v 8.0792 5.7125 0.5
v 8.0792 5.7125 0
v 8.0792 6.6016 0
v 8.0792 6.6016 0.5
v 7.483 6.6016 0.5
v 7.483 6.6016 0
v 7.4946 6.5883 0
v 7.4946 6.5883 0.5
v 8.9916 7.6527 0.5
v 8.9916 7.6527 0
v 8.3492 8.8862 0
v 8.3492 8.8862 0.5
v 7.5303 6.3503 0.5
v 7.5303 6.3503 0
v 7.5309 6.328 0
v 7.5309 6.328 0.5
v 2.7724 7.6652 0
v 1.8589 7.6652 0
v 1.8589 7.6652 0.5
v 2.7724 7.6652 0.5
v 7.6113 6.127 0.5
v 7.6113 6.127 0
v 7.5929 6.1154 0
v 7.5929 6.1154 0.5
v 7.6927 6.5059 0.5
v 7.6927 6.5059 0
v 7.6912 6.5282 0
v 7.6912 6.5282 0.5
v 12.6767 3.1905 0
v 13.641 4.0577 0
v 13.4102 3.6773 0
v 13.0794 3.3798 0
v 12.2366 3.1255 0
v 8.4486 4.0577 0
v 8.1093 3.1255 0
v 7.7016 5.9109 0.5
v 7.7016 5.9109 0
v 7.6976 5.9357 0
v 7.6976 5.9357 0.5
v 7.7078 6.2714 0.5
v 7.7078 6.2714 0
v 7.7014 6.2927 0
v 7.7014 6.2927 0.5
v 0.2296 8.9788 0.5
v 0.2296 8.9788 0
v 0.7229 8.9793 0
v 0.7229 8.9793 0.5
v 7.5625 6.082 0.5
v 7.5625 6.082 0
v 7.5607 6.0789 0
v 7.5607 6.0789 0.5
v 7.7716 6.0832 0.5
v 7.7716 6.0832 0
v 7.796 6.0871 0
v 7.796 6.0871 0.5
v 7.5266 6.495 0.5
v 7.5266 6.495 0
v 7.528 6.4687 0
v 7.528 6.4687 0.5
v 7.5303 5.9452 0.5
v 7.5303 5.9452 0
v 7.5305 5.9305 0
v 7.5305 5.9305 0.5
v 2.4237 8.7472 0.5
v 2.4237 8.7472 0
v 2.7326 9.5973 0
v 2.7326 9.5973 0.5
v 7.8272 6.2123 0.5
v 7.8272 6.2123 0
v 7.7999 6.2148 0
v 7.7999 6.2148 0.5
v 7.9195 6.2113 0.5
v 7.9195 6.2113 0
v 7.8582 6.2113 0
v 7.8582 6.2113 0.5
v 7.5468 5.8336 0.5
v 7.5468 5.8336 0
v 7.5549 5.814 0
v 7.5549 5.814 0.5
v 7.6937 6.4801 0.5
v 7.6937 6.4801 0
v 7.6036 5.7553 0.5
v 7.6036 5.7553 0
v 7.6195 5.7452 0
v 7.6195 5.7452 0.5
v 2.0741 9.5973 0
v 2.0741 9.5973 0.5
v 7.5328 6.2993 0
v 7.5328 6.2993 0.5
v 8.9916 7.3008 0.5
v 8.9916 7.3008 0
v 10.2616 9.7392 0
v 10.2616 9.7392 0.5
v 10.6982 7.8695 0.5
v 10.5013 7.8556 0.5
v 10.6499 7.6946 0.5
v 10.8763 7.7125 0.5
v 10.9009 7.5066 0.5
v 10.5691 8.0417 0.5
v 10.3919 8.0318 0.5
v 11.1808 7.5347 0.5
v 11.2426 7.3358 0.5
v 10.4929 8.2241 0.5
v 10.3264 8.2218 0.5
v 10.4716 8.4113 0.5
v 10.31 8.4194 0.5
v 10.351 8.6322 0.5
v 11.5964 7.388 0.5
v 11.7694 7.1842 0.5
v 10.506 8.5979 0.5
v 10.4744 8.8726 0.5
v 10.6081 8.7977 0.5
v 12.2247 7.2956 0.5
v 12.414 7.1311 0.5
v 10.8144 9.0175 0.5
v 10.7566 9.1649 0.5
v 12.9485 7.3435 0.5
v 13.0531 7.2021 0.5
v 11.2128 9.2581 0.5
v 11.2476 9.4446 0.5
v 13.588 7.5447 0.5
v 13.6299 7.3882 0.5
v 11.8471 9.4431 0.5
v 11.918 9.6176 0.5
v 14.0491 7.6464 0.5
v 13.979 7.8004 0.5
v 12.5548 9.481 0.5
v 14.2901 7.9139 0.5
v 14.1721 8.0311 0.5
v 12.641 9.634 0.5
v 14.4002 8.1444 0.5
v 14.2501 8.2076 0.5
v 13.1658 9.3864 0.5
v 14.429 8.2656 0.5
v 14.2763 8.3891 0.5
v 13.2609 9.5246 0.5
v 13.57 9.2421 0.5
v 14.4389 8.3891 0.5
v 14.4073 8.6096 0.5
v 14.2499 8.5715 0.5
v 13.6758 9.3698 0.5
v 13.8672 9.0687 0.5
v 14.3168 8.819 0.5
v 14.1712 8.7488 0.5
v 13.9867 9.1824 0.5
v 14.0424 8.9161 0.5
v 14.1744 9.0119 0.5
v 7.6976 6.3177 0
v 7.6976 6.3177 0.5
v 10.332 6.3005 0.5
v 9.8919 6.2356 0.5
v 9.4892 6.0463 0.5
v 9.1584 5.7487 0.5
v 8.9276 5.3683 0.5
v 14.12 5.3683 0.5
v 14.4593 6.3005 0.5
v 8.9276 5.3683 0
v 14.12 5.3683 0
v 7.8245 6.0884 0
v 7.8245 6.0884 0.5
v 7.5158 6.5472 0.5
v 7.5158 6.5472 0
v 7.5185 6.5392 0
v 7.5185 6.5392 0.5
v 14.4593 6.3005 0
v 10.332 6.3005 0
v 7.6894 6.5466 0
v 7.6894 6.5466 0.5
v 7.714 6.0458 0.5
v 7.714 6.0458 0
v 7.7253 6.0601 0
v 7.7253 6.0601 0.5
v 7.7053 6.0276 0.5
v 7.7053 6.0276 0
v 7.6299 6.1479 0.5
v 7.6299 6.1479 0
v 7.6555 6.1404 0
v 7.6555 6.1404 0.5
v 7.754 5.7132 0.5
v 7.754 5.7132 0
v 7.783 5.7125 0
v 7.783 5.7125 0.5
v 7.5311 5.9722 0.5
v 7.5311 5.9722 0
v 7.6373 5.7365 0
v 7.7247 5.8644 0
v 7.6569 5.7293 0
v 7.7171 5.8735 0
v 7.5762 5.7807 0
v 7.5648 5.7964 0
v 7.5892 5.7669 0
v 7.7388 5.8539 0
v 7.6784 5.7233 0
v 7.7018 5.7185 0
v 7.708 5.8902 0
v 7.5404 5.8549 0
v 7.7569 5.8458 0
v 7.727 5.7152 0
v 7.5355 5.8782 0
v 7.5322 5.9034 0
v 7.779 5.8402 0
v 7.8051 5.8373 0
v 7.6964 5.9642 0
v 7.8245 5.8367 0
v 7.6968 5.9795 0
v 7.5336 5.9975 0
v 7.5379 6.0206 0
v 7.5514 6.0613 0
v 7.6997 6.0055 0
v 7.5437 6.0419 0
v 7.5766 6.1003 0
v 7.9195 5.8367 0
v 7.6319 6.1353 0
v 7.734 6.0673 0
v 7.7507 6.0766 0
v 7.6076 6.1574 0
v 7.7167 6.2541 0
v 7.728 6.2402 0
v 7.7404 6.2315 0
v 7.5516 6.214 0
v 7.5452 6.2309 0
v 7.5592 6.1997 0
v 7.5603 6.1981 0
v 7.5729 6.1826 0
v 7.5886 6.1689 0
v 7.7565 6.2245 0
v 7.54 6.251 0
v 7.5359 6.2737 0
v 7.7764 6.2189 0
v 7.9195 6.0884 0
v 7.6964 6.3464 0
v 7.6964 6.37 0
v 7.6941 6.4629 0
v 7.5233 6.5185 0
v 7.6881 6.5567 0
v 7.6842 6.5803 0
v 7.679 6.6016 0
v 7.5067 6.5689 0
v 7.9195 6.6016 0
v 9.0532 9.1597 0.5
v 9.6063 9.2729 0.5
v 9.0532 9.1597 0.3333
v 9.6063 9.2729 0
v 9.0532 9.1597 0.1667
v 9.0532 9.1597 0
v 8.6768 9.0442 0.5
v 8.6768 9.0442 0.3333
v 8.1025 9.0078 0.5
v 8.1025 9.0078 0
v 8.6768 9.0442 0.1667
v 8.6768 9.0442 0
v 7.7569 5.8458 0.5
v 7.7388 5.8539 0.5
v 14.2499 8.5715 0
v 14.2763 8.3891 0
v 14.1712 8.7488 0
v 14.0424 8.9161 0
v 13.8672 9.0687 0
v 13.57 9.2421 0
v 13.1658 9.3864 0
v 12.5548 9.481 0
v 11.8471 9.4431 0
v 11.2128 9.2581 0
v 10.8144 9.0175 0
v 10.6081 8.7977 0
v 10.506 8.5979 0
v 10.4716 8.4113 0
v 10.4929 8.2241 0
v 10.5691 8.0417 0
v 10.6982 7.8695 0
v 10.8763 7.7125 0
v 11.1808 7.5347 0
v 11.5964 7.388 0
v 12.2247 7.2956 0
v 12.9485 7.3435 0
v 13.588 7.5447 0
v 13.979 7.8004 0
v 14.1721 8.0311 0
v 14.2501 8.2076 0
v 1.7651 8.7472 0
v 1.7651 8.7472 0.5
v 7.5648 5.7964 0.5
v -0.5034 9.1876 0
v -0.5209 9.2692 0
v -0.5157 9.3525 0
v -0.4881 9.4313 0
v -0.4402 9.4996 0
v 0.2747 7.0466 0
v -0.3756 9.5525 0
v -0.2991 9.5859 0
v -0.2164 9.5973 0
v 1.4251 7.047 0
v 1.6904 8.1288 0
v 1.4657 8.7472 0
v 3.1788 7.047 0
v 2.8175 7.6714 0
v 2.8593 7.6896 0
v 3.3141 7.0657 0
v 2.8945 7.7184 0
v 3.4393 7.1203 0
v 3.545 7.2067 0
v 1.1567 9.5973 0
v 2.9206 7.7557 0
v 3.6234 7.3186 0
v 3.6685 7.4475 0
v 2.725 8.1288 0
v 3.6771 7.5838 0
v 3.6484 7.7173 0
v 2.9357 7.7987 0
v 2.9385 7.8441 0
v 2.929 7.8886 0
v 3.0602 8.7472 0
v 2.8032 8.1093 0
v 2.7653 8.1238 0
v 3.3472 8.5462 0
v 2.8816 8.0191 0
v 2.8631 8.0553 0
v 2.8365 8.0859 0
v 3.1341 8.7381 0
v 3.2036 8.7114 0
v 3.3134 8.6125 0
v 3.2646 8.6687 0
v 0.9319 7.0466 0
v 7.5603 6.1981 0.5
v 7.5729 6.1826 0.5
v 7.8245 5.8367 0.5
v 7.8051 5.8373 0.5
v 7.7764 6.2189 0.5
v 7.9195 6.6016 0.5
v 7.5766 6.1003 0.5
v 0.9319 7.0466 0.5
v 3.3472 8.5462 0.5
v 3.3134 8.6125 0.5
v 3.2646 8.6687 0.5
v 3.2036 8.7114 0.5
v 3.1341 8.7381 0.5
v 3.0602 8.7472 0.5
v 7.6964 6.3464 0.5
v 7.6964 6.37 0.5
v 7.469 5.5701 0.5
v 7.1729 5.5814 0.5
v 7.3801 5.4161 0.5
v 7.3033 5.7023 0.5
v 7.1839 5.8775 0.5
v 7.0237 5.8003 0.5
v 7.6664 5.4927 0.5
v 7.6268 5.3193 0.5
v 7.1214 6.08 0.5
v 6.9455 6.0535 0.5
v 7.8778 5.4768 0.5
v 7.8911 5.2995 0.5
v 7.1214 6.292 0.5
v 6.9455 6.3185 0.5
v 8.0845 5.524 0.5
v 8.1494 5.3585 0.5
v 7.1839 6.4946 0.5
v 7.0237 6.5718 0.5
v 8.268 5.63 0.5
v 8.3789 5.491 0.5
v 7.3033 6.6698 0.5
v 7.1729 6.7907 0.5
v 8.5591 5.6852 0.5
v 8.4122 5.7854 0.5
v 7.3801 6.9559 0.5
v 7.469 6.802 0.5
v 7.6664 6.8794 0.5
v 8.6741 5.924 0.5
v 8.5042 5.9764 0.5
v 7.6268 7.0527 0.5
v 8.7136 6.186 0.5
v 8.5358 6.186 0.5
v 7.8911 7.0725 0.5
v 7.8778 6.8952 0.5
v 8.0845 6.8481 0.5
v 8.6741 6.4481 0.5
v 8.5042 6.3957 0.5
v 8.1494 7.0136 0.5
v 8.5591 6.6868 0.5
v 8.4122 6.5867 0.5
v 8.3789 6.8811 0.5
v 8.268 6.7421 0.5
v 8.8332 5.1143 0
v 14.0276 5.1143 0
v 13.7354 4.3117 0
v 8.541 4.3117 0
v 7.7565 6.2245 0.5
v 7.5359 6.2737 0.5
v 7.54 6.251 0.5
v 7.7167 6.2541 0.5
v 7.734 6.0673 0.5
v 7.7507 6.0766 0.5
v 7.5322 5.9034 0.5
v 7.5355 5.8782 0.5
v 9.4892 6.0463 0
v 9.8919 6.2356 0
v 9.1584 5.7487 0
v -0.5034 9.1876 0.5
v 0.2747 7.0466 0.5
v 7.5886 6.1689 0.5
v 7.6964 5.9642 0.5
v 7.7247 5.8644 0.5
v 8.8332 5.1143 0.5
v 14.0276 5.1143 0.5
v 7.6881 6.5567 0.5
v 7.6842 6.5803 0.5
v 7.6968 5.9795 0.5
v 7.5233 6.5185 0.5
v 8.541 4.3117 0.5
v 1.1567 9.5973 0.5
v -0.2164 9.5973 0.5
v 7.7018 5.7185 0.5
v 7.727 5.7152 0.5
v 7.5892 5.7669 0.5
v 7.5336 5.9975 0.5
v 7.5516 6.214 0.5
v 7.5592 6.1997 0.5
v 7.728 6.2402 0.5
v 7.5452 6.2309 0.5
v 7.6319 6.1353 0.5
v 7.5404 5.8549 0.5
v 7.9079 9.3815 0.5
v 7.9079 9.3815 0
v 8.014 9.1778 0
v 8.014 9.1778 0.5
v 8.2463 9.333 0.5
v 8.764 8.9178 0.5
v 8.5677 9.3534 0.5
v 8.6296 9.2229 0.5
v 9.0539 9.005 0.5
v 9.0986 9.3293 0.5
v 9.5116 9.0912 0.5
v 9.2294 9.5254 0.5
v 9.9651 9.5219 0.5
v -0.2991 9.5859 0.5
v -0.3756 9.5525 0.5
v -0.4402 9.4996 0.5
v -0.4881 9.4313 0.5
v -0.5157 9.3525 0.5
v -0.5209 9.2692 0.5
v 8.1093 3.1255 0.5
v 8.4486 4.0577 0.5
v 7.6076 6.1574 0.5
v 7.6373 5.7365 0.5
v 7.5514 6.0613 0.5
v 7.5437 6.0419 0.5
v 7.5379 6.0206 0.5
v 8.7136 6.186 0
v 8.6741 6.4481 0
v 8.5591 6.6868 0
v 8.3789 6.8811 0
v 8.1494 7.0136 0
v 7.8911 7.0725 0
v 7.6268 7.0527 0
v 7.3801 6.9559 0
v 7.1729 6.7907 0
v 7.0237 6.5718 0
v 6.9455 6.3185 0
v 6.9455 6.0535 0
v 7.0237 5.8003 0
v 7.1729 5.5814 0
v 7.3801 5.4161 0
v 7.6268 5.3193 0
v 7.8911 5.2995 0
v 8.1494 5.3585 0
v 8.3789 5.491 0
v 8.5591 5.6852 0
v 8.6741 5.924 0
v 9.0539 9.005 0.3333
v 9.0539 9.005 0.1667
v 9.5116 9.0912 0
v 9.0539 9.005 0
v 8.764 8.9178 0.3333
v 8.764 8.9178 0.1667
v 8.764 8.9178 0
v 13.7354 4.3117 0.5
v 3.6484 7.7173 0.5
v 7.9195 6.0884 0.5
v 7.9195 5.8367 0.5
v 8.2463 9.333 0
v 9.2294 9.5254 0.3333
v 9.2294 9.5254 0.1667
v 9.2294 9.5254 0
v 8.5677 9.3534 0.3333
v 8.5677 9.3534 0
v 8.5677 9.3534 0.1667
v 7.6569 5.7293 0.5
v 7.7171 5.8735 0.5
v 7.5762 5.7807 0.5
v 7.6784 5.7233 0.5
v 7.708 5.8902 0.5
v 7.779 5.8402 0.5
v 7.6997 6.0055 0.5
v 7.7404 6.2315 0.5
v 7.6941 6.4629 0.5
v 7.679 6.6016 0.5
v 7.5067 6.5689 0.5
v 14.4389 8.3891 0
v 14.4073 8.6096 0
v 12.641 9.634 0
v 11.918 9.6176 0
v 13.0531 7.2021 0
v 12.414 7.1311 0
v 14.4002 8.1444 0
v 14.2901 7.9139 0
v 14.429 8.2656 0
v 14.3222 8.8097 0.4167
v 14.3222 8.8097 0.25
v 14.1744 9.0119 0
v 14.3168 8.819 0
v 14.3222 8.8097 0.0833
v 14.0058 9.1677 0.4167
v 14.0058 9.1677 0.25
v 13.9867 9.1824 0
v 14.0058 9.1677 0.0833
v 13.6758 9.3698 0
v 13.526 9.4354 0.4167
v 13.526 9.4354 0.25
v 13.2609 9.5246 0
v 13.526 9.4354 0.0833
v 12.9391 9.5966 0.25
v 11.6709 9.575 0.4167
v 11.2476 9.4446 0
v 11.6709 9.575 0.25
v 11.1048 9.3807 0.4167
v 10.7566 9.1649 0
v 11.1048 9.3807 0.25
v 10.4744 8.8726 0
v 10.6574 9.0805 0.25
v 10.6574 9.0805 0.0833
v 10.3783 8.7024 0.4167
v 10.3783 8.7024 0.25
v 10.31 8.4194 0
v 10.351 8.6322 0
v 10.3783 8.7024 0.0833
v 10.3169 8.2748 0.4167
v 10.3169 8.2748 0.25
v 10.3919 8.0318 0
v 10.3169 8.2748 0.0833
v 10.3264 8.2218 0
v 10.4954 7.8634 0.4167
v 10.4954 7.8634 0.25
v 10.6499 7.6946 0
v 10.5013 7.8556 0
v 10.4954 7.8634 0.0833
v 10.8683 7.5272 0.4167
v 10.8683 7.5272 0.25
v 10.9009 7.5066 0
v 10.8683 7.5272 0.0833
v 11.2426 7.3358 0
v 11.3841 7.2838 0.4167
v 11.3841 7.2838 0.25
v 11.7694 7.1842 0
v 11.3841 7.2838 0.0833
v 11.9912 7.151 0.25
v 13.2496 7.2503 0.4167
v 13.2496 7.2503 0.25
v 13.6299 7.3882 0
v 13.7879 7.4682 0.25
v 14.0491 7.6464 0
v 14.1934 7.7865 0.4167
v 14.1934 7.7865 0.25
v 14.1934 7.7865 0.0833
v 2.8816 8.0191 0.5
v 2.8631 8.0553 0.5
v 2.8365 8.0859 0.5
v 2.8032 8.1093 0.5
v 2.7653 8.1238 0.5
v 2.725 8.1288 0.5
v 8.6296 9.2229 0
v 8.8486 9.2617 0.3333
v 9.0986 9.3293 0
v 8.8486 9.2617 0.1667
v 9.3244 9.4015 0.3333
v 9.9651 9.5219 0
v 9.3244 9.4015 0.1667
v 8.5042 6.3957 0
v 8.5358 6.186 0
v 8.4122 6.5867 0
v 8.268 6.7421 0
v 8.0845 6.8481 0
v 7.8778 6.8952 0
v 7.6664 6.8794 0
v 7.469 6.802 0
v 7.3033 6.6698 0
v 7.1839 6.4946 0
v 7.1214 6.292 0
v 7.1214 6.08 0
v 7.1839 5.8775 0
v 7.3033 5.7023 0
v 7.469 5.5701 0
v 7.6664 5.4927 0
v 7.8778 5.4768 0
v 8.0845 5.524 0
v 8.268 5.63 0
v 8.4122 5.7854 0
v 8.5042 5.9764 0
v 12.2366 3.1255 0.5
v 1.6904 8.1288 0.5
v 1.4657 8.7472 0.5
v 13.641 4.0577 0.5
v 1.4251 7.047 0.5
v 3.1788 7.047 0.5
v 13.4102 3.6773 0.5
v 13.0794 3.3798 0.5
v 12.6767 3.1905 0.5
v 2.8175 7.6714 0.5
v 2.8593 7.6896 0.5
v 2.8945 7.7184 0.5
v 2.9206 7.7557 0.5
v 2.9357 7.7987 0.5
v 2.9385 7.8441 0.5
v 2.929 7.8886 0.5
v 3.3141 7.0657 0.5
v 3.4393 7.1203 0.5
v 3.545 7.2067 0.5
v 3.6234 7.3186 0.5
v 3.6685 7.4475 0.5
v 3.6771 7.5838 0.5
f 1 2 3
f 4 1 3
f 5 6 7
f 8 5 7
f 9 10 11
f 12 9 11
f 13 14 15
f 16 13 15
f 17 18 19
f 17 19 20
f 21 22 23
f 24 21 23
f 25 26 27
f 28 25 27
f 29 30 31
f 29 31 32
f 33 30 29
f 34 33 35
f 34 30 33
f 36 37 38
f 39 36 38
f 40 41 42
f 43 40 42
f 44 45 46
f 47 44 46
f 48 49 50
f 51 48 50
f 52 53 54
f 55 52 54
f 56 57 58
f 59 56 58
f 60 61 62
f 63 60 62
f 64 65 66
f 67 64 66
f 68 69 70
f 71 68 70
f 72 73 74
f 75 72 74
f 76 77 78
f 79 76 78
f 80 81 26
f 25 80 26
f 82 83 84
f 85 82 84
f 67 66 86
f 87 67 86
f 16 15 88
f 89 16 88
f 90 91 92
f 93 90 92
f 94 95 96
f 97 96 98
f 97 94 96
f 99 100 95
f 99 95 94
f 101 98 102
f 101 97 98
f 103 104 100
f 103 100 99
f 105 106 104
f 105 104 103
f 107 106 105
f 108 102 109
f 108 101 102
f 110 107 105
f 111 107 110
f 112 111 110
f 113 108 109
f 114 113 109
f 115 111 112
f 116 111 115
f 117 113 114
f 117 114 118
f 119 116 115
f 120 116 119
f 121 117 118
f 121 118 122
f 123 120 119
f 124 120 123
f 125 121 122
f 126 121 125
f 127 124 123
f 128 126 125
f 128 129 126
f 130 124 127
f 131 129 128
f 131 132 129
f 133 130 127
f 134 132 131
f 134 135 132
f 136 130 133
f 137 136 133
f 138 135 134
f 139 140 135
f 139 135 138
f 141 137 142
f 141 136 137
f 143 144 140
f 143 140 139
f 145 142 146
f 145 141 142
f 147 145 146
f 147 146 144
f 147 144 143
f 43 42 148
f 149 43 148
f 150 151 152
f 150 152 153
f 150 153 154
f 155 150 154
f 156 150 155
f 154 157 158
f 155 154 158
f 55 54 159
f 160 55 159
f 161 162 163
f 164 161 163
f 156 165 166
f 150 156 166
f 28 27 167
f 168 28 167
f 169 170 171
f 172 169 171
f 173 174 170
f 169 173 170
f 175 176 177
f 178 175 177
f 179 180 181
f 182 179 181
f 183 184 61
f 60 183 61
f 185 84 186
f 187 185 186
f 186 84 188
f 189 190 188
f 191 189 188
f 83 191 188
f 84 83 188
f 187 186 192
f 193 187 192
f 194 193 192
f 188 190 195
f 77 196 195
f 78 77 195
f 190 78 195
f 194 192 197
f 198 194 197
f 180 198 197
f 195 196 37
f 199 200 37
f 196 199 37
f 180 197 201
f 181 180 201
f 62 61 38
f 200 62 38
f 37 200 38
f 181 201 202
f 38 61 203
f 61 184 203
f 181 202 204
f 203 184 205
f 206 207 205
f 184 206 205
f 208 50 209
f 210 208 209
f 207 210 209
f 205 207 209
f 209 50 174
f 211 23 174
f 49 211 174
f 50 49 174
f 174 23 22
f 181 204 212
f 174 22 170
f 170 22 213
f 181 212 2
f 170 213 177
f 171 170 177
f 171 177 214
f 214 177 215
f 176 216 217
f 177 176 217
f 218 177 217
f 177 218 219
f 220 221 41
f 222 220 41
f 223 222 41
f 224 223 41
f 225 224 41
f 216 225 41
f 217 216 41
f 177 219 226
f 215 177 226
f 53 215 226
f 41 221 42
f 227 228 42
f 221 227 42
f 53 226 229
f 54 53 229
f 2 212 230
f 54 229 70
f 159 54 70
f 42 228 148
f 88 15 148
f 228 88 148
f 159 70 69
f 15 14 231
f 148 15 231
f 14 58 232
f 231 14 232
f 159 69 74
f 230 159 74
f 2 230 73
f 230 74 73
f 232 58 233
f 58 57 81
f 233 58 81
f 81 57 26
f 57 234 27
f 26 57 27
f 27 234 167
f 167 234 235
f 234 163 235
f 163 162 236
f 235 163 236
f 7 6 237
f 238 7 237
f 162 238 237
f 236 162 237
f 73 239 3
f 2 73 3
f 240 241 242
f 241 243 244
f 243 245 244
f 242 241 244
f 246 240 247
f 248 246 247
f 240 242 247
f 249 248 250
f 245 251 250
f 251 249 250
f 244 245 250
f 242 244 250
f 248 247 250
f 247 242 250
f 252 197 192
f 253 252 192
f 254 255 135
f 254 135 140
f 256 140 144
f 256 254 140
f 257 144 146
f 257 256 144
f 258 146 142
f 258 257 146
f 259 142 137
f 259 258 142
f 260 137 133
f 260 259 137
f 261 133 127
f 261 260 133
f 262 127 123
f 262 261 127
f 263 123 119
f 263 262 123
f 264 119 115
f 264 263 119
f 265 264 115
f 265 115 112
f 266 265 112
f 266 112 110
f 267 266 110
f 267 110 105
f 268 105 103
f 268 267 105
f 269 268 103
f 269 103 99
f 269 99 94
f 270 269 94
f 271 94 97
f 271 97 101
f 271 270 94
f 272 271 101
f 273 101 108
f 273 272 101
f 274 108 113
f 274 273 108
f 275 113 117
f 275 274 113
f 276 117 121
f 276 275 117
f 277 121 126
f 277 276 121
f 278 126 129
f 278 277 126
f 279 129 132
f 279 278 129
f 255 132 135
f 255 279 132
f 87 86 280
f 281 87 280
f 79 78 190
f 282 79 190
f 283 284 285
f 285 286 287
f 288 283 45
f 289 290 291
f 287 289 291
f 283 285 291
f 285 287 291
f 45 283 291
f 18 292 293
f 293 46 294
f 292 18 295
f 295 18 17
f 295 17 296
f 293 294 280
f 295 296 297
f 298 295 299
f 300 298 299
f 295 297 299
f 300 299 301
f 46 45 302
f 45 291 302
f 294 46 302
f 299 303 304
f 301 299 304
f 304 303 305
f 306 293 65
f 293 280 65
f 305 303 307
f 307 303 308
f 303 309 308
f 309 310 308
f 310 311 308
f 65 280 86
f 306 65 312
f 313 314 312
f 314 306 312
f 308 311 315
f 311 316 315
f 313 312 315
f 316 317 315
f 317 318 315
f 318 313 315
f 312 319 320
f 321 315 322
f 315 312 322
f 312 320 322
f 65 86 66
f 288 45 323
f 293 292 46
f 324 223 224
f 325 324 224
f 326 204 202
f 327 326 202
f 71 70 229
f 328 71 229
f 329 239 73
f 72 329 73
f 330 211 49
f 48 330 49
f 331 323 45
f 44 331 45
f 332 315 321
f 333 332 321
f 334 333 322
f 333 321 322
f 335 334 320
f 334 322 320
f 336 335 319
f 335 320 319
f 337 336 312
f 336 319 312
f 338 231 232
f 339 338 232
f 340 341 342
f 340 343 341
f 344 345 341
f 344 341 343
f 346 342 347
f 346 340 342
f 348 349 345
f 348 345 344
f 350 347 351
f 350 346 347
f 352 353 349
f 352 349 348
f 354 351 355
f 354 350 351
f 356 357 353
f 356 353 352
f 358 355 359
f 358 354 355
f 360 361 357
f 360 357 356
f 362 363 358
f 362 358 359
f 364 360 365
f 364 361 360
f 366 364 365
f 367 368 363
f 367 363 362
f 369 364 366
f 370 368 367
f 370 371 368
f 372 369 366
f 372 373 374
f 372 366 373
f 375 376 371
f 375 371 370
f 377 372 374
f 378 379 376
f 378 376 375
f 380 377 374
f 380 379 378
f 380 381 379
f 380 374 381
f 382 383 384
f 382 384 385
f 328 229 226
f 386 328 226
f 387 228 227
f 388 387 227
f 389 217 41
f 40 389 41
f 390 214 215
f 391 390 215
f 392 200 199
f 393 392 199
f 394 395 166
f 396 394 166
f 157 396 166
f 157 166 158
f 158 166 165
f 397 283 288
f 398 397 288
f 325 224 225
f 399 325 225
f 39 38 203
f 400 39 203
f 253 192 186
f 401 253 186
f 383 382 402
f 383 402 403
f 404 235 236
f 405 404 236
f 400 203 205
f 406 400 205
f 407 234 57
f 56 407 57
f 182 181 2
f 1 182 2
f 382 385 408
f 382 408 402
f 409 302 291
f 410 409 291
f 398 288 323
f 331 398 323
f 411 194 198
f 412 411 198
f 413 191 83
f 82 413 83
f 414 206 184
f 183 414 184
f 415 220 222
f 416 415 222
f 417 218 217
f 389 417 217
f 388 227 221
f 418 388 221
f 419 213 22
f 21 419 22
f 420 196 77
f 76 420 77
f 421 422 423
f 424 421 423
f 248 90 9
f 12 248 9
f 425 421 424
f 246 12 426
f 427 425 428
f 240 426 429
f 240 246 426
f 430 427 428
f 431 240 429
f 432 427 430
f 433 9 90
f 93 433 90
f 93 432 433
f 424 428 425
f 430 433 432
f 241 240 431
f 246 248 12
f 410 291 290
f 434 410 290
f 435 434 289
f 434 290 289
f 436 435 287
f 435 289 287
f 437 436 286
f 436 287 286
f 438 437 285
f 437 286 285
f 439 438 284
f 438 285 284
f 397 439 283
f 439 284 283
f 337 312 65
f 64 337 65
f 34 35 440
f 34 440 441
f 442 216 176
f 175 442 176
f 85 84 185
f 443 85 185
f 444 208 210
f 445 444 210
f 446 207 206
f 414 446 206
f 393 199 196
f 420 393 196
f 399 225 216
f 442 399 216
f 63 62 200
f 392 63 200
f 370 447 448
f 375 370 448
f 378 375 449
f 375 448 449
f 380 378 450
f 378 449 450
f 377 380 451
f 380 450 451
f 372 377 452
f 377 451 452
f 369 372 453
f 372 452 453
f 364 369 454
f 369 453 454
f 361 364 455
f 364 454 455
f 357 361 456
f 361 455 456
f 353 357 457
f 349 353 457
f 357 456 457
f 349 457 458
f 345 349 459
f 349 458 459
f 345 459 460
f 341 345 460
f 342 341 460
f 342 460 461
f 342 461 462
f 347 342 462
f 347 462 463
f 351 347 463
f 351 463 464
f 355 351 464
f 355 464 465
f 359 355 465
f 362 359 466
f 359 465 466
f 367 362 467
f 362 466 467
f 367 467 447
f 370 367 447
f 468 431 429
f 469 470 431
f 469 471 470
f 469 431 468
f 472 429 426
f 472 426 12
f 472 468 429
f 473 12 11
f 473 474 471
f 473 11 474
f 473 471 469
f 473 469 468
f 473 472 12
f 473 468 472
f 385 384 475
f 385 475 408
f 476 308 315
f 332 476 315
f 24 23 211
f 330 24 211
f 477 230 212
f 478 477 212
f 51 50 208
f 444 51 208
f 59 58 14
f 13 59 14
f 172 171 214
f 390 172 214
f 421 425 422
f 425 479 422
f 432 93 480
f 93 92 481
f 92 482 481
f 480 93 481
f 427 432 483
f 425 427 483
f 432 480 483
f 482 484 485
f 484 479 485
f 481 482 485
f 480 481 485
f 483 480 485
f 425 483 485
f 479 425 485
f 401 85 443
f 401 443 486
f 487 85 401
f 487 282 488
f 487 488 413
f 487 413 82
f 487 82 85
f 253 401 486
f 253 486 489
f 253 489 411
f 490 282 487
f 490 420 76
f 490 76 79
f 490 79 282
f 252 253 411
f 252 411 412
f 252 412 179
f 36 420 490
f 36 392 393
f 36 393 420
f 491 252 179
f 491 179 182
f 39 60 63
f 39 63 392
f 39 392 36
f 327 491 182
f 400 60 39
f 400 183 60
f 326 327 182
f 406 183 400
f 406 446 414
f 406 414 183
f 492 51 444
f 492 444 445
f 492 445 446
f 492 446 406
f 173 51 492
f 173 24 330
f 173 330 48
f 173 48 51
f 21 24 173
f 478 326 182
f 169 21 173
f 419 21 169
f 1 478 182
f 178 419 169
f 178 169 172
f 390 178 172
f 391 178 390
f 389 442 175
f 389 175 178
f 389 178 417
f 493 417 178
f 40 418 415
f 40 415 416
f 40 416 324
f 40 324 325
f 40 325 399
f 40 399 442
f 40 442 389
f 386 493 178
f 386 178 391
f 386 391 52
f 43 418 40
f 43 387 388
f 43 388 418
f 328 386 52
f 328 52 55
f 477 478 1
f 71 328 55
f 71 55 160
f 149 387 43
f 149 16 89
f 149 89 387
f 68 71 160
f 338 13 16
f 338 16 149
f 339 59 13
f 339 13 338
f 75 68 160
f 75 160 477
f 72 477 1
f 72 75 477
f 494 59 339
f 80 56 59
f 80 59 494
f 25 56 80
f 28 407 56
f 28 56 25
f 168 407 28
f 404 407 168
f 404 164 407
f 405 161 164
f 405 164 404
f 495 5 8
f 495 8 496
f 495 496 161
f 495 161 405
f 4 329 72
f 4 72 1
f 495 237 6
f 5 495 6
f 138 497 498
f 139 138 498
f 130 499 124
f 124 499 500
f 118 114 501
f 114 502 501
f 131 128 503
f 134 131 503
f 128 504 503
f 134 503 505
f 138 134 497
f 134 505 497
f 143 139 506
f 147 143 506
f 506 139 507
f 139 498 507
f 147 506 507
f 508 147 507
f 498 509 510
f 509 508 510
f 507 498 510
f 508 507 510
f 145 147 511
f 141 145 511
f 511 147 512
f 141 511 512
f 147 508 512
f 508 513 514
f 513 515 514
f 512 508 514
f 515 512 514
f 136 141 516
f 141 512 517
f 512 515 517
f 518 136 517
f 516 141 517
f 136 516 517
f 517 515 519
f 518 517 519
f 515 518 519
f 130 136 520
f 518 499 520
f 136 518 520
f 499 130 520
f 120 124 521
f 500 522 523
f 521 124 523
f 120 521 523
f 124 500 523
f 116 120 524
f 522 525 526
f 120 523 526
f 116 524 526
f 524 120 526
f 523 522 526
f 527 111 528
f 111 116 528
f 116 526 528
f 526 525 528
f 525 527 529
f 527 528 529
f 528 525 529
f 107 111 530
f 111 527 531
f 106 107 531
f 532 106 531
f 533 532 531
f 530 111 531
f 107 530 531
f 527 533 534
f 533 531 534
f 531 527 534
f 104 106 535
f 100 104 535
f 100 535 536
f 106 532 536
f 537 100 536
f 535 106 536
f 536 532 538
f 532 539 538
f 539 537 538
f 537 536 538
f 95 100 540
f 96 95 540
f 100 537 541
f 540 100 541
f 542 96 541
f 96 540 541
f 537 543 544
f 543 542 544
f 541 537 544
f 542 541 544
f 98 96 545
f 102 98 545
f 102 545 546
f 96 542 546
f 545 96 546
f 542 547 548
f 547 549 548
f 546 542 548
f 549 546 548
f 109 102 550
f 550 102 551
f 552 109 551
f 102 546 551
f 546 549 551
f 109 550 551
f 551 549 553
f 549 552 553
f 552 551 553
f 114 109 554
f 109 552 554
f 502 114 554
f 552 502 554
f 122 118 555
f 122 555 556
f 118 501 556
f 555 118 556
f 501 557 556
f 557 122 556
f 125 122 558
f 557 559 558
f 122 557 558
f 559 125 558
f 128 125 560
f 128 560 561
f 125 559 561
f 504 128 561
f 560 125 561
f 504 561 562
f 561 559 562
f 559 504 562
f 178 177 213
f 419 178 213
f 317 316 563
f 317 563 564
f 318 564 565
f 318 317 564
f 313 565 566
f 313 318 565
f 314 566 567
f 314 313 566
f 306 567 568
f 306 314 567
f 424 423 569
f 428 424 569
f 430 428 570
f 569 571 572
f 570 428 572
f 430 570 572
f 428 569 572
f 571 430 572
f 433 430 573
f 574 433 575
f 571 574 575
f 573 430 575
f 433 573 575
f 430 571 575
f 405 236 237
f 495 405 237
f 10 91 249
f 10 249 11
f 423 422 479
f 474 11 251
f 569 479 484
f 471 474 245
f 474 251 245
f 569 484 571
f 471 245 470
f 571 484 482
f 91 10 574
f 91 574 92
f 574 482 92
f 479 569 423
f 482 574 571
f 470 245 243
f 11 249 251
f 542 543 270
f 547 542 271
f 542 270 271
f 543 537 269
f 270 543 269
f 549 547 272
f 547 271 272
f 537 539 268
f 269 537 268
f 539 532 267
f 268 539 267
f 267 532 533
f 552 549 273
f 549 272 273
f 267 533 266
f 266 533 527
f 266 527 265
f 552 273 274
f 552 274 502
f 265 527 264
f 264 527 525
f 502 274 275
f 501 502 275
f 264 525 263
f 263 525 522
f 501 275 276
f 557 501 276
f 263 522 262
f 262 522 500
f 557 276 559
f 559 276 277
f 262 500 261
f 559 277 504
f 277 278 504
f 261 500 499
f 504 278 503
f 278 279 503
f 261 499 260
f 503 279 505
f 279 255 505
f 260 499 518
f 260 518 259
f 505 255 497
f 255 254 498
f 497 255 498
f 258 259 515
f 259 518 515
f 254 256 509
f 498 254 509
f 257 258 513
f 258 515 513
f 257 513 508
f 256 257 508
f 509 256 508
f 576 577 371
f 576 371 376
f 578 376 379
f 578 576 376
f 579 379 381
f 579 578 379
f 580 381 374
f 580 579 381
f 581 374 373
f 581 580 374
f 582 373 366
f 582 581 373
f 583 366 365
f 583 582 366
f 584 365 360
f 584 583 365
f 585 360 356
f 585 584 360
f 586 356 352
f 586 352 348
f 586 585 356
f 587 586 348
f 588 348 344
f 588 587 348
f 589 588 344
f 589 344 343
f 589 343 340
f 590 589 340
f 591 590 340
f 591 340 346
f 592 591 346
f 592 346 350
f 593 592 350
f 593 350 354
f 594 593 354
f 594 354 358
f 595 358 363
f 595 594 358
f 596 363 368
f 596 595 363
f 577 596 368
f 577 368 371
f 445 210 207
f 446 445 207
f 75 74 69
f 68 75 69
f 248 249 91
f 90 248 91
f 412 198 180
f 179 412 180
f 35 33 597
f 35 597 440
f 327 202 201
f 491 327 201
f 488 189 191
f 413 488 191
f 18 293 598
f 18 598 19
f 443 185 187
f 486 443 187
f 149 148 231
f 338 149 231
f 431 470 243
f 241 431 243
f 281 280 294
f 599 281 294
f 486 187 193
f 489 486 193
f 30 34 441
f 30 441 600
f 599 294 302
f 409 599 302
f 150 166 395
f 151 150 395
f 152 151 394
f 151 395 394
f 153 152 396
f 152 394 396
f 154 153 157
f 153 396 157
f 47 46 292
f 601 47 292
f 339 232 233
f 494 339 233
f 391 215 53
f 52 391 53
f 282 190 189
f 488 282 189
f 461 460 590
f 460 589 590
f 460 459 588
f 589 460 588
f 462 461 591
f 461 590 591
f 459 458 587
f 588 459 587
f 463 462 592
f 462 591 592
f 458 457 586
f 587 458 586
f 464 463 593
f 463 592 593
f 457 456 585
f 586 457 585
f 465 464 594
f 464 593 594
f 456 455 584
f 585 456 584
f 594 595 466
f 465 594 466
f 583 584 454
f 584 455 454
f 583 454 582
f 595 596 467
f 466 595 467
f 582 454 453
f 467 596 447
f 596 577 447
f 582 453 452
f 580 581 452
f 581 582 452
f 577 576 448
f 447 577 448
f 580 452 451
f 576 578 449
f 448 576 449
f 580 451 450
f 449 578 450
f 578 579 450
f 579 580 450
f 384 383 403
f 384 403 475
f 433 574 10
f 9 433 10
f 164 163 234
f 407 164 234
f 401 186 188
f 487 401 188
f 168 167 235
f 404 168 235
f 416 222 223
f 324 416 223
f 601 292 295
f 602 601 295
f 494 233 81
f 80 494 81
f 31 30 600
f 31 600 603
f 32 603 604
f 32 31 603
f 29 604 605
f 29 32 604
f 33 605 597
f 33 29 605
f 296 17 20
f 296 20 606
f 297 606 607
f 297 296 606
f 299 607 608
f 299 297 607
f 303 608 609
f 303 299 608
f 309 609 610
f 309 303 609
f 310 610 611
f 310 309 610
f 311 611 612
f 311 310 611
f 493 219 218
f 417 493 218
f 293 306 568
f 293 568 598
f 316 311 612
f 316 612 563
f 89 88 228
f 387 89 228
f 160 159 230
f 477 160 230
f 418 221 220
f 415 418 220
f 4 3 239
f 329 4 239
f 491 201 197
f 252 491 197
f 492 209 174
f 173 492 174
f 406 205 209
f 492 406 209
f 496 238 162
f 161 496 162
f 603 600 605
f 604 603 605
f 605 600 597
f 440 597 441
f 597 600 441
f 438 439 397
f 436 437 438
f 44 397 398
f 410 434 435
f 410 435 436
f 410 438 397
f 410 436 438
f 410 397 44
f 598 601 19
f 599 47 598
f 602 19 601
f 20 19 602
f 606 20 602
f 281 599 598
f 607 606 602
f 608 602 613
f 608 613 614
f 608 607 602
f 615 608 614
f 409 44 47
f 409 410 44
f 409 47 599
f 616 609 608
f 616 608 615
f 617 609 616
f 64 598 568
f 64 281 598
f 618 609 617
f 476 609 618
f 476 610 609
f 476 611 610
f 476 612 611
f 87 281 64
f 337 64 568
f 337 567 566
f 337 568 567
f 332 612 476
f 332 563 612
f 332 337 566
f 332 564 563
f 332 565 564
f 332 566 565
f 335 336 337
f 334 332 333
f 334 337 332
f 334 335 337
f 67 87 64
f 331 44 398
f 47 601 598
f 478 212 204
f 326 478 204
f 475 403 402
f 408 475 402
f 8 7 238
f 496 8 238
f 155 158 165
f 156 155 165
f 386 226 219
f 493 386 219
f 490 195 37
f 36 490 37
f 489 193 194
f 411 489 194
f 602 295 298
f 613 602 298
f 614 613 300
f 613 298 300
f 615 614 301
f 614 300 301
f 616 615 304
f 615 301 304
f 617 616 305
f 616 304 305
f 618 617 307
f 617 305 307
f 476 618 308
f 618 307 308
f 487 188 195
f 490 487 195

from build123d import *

# Parameters (mm, degrees)
SKETCH_1_R        = 0.889
SKETCH_1_R_2      = 0.7112
EXTRUDE_1_DEPTH   = 0.5
EXTRUDE_1_2_DEPTH = 0.5
EXTRUDE_1_3_DEPTH = 0.5
EXTRUDE_1_4_DEPTH = 0.5
EXTRUDE_1_5_DEPTH = 0.5
EXTRUDE_1_6_DEPTH = 0.5
EXTRUDE_1_7_DEPTH = 0.5
SKETCH_1_RX       = 1.902570153
SKETCH_1_RY       = 1.096871421
EXTRUDE_1_8_DEPTH = 0.5


with BuildPart() as part:
    # 草圖1 → 填料-伸長1 (new body)
    with BuildSketch(Plane.XY):
        with Locations((7.824620046, 6.186033695)):
            Circle(SKETCH_1_R)
        with Locations((7.824620046, 6.186033695)):
            Circle(SKETCH_1_R_2, mode=Mode.SUBTRACT)
    extrude(amount=EXTRUDE_1_DEPTH)


with BuildPart() as body_2:
    # 草圖1 → Extrude 1 2 (new body)
    with BuildSketch(Plane.XY):
        with BuildLine():
            Line((8.448576012, 4.057698906), (13.640963376, 4.057698906))
            ThreePointArc((13.640963376, 4.057698906), (13.079373986, 3.379772931), (12.236568457, 3.125518906))
            Line((12.236568457, 3.125518906), (8.109290239, 3.125518906))
            Line((8.109290239, 3.125518906), (8.448576012, 4.057698906))
        make_face()
    extrude(amount=EXTRUDE_1_2_DEPTH)


with BuildPart() as body_3:
    # 草圖1 → Extrude 1 3 (new body)
    with BuildSketch(Plane.XY):
        with BuildLine():
            Line((8.927617103, 5.368338906), (14.120004466, 5.368338906))
            Line((14.120004466, 5.368338906), (14.459290239, 6.300518906))
            Line((14.459290239, 6.300518906), (10.332012021, 6.300518906))
            ThreePointArc((10.332012021, 6.300518906), (9.489206492, 6.04626488), (8.927617103, 5.368338906))
        make_face()
    extrude(amount=EXTRUDE_1_3_DEPTH)


with BuildPart() as body_4:
    # 草圖1 → Extrude 1 4 (new body)
    with BuildSketch(Plane.XY):
        Polygon((14.027556027, 5.114338906), (13.735418958, 4.311698906), (8.541024452, 4.311698906), (8.833161521, 5.114338906), align=None)
    extrude(amount=EXTRUDE_1_4_DEPTH)


with BuildPart() as body_5:
    # 草圖1 → Extrude 1 5 (new body)
    with BuildSketch(Plane.XY):
        Polygon((7.919538281, 6.601565182), (7.919538281, 6.211288228), (7.8631351, 6.211288228), (7.858176578, 6.211288228), (7.82718582, 6.212321253), (7.799913952, 6.214800514), (7.776360975, 6.218932615), (7.75652689, 6.224510951), (7.740411695, 6.231535523), (7.728015392, 6.240212936), (7.716652114, 6.254055475), (7.707768096, 6.2714103), (7.701363339, 6.29269062), (7.697644448, 6.317689832), (7.696404818, 6.346407936), (7.696404818, 6.369960912), (7.694132162, 6.462933188), (7.693718952, 6.480081408), (7.692685927, 6.50590704), (7.691239692, 6.528220386), (7.689380246, 6.546608237), (7.688140616, 6.556731884), (7.68421512, 6.580284861), (7.679049993, 6.601565182), (7.482981793, 6.601565182), (7.494551677, 6.588342458), (7.506741375, 6.568921583), (7.515831998, 6.547228052), (7.518517863, 6.539170455), (7.52326978, 6.518509949), (7.526575461, 6.494956972), (7.528021696, 6.46871813), (7.530294352, 6.350333432), (7.530914167, 6.328020085), (7.532773612, 6.299301982), (7.535872688, 6.273682955), (7.540004789, 6.250956399), (7.545169916, 6.230915708), (7.551574673, 6.213974093), (7.55921906, 6.199718344), (7.560252085, 6.198065504), (7.572854993, 6.182570125), (7.588556978, 6.168934191), (7.607564643, 6.157364308), (7.629877989, 6.147860475), (7.655497017, 6.140422693), (7.63194404, 6.135257566), (7.611283534, 6.126993364), (7.592895684, 6.115423481), (7.576573885, 6.100341312), (7.562524741, 6.081953461), (7.560665295, 6.078854386), (7.551368067, 6.061292956), (7.54372368, 6.04187208), (7.537938739, 6.020591759), (7.533600032, 5.997451993), (7.531120772, 5.972246176), (7.530294352, 5.945180913), (7.530500957, 5.930511954), (7.532153797, 5.903446691), (7.535459478, 5.878240874), (7.540417999, 5.854894503), (7.546822756, 5.833614182), (7.554880353, 5.813986701), (7.564797396, 5.796425272), (7.576160674, 5.780723287), (7.589176793, 5.766880748), (7.603639147, 5.755310865), (7.619547737, 5.745187217), (7.637315772, 5.736509805), (7.656943252, 5.729278628), (7.678430178, 5.723287081), (7.70177655, 5.718535165), (7.726982367, 5.715229484), (7.754047629, 5.713163433), (7.782972337, 5.712543618), (8.07924399, 5.712543618), (8.07924399, 6.601565182), align=None)
        Polygon((7.919538281, 5.836713258), (7.824499954, 5.836713258), (7.805079079, 5.837333073), (7.779046841, 5.840225544), (7.7569401, 5.84580388), (7.738758855, 5.853861478), (7.724709711, 5.864398336), (7.717065324, 5.873488958), (7.707974701, 5.890223968), (7.701569945, 5.910884474), (7.697644448, 5.935677081), (7.696404818, 5.964188578), (7.696818028, 5.979477353), (7.699710499, 6.00550959), (7.705288836, 6.027616331), (7.713966248, 6.045797576), (7.725329526, 6.060053325), (7.734006939, 6.067284502), (7.750741948, 6.07658173), (7.771609059, 6.083193092), (7.795988456, 6.087118588), (7.824499954, 6.088358218), (7.919538281, 6.088358218), align=None, mode=Mode.SUBTRACT)
    extrude(amount=EXTRUDE_1_5_DEPTH)


with BuildPart() as body_6:
    # 草圖1 → Extrude 1 6 (new body)
    with BuildSketch(Plane.XY):
        with BuildLine():
            Line((7.907906052, 9.381456034), (8.013954697, 9.177842636))
            add(Edge.make_bspline(
                [(8.013954697, 9.177842636), (9.202583564, 9.208703992), (9.06746162, 9.436235238), (9.965079322, 9.52187855)],
                knots=[0, 0, 0, 0, 1, 1, 1, 1], degree=3))
            Line((9.965079322, 9.52187855), (8.991567924, 7.652736666))
            Line((8.991567924, 7.652736666), (8.349150686, 8.886177764))
            add(Edge.make_bspline(
                [(9.511635217, 9.091155152), (8.872328744, 9.024542452), (8.924079312, 8.871067484), (8.349150686, 8.886177764)],
                knots=[0, 0, 0, 0, 1, 1, 1, 1], degree=3))
            Line((9.511635217, 9.091155152), (9.606301905, 9.272915193))
            add(Edge.make_bspline(
                [(9.606301905, 9.272915193), (8.840115122, 9.188083566), (8.900448019, 8.977404436), (8.102538787, 9.007761183)],
                knots=[0, 0, 0, 0, 1, 1, 1, 1], degree=3))
            Line((8.102538787, 9.007761183), (8.991567924, 7.300825241))
            Line((8.991567924, 7.300825241), (10.261567924, 9.739225241))
            add(Edge.make_bspline(
                [(10.261567924, 9.739225241), (8.921312557, 9.55739804), (8.689689544, 9.200472508), (7.907906052, 9.381456034)],
                knots=[0, 0, 0, 0, 1, 1, 1, 1], degree=3))
        make_face()
    extrude(amount=EXTRUDE_1_6_DEPTH)


with BuildPart() as body_7:
    # 草圖1 → Extrude 1 7 (new body)
    with BuildSketch(Plane.XY):
        with BuildLine():
            Line((3.648400437, 7.717338976), (3.347189613, 8.546157624))
            ThreePointArc((3.347189613, 8.546157624), (3.235404155, 8.691948886), (3.060199048, 8.747214167))
            Line((3.060199048, 8.747214167), (2.423711702, 8.747214167))
            Line((2.423711702, 8.747214167), (2.732637212, 9.597260723))
            Line((2.732637212, 9.597260723), (2.074075306, 9.597260723))
            Line((2.074075306, 9.597260723), (1.765149796, 8.747214167))
            Line((1.765149796, 8.747214167), (1.465653194, 8.747214167))
            Line((1.465653194, 8.747214167), (1.156727684, 9.597260723))
            Line((1.156727684, 9.597260723), (-0.216419324, 9.597260723))
            ThreePointArc((-0.216419324, 9.597260723), (-0.466509234, 9.467110639), (-0.503409889, 9.187606883))
            Line((-0.503409889, 9.187606883), (0.274692026, 7.046563713))
            Line((0.274692026, 7.046563713), (0.931865953, 7.046563713))
            Line((0.931865953, 7.046563713), (0.229634017, 8.978841301))
            Line((0.229634017, 8.978841301), (0.722894497, 8.979273917))
            Line((0.722894497, 8.979273917), (1.425126434, 7.046996329))
            Line((1.425126434, 7.046996329), (3.178779512, 7.046996329))
            ThreePointArc((3.178779512, 7.046996329), (3.588017547, 7.259969194), (3.648400437, 7.717338976))
        make_face()
        with BuildLine():
            Line((2.92897741, 7.888625033), (2.881561778, 8.019094979))
            ThreePointArc((2.881561778, 8.019094979), (2.820587892, 8.098617485), (2.72502147, 8.128762184))
            Line((2.72502147, 8.128762184), (1.690412171, 8.128762184))
            Line((1.690412171, 8.128762184), (1.85888899, 7.665177484))
            Line((1.85888899, 7.665177484), (2.772437101, 7.665177484))
            ThreePointArc((2.772437101, 7.665177484), (2.90884978, 7.736168439), (2.92897741, 7.888625033))
        make_face(mode=Mode.SUBTRACT)
    extrude(amount=EXTRUDE_1_7_DEPTH)


with BuildPart() as body_8:
    # 草圖1 → Extrude 1 8 (new body)
    with BuildSketch(Plane.XY):
        with BuildLine():
            add(Edge.make_bspline(
                [(10.316882212, 8.274782131), (10.402257091, 7.684151743), (11.143946605, 7.246347921), (12.838410216, 7.055705795), (13.765534918, 7.299190986), (14.348230312, 7.962823838), (14.438898128, 8.173755435), (14.438898128, 8.389130691)],
                knots=[3.224735905, 3.224735905, 3.224735905, 3.224735905, 4.519659891, 4.519659891, 5.814583877, 5.814583877, 6.283185307, 6.283185307, 6.283185307, 6.283185307], degree=3))
            add(Edge.make_bspline(
                [(14.438898128, 8.389130691), (14.438898128, 8.680933367), (14.272126572, 8.959237611), (13.462567368, 9.592838027), (12.482877783, 9.750625339), (10.858960547, 9.399280444), (10.231507333, 8.865412519), (10.316882212, 8.274782131)],
                knots=[0, 0, 0, 0, 0.634887934, 0.634887934, 1.92981192, 1.92981192, 3.224735905, 3.224735905, 3.224735905, 3.224735905], degree=3))
        make_face()
        with Locations(Location((12.373767975, 8.389130691), (0, 0, 0))):
            Ellipse(SKETCH_1_RX, SKETCH_1_RY, mode=Mode.SUBTRACT)
    extrude(amount=EXTRUDE_1_8_DEPTH)


solid = Compound([part.part, body_2.part, body_3.part, body_4.part, body_5.part, body_6.part, body_7.part, body_8.part])
